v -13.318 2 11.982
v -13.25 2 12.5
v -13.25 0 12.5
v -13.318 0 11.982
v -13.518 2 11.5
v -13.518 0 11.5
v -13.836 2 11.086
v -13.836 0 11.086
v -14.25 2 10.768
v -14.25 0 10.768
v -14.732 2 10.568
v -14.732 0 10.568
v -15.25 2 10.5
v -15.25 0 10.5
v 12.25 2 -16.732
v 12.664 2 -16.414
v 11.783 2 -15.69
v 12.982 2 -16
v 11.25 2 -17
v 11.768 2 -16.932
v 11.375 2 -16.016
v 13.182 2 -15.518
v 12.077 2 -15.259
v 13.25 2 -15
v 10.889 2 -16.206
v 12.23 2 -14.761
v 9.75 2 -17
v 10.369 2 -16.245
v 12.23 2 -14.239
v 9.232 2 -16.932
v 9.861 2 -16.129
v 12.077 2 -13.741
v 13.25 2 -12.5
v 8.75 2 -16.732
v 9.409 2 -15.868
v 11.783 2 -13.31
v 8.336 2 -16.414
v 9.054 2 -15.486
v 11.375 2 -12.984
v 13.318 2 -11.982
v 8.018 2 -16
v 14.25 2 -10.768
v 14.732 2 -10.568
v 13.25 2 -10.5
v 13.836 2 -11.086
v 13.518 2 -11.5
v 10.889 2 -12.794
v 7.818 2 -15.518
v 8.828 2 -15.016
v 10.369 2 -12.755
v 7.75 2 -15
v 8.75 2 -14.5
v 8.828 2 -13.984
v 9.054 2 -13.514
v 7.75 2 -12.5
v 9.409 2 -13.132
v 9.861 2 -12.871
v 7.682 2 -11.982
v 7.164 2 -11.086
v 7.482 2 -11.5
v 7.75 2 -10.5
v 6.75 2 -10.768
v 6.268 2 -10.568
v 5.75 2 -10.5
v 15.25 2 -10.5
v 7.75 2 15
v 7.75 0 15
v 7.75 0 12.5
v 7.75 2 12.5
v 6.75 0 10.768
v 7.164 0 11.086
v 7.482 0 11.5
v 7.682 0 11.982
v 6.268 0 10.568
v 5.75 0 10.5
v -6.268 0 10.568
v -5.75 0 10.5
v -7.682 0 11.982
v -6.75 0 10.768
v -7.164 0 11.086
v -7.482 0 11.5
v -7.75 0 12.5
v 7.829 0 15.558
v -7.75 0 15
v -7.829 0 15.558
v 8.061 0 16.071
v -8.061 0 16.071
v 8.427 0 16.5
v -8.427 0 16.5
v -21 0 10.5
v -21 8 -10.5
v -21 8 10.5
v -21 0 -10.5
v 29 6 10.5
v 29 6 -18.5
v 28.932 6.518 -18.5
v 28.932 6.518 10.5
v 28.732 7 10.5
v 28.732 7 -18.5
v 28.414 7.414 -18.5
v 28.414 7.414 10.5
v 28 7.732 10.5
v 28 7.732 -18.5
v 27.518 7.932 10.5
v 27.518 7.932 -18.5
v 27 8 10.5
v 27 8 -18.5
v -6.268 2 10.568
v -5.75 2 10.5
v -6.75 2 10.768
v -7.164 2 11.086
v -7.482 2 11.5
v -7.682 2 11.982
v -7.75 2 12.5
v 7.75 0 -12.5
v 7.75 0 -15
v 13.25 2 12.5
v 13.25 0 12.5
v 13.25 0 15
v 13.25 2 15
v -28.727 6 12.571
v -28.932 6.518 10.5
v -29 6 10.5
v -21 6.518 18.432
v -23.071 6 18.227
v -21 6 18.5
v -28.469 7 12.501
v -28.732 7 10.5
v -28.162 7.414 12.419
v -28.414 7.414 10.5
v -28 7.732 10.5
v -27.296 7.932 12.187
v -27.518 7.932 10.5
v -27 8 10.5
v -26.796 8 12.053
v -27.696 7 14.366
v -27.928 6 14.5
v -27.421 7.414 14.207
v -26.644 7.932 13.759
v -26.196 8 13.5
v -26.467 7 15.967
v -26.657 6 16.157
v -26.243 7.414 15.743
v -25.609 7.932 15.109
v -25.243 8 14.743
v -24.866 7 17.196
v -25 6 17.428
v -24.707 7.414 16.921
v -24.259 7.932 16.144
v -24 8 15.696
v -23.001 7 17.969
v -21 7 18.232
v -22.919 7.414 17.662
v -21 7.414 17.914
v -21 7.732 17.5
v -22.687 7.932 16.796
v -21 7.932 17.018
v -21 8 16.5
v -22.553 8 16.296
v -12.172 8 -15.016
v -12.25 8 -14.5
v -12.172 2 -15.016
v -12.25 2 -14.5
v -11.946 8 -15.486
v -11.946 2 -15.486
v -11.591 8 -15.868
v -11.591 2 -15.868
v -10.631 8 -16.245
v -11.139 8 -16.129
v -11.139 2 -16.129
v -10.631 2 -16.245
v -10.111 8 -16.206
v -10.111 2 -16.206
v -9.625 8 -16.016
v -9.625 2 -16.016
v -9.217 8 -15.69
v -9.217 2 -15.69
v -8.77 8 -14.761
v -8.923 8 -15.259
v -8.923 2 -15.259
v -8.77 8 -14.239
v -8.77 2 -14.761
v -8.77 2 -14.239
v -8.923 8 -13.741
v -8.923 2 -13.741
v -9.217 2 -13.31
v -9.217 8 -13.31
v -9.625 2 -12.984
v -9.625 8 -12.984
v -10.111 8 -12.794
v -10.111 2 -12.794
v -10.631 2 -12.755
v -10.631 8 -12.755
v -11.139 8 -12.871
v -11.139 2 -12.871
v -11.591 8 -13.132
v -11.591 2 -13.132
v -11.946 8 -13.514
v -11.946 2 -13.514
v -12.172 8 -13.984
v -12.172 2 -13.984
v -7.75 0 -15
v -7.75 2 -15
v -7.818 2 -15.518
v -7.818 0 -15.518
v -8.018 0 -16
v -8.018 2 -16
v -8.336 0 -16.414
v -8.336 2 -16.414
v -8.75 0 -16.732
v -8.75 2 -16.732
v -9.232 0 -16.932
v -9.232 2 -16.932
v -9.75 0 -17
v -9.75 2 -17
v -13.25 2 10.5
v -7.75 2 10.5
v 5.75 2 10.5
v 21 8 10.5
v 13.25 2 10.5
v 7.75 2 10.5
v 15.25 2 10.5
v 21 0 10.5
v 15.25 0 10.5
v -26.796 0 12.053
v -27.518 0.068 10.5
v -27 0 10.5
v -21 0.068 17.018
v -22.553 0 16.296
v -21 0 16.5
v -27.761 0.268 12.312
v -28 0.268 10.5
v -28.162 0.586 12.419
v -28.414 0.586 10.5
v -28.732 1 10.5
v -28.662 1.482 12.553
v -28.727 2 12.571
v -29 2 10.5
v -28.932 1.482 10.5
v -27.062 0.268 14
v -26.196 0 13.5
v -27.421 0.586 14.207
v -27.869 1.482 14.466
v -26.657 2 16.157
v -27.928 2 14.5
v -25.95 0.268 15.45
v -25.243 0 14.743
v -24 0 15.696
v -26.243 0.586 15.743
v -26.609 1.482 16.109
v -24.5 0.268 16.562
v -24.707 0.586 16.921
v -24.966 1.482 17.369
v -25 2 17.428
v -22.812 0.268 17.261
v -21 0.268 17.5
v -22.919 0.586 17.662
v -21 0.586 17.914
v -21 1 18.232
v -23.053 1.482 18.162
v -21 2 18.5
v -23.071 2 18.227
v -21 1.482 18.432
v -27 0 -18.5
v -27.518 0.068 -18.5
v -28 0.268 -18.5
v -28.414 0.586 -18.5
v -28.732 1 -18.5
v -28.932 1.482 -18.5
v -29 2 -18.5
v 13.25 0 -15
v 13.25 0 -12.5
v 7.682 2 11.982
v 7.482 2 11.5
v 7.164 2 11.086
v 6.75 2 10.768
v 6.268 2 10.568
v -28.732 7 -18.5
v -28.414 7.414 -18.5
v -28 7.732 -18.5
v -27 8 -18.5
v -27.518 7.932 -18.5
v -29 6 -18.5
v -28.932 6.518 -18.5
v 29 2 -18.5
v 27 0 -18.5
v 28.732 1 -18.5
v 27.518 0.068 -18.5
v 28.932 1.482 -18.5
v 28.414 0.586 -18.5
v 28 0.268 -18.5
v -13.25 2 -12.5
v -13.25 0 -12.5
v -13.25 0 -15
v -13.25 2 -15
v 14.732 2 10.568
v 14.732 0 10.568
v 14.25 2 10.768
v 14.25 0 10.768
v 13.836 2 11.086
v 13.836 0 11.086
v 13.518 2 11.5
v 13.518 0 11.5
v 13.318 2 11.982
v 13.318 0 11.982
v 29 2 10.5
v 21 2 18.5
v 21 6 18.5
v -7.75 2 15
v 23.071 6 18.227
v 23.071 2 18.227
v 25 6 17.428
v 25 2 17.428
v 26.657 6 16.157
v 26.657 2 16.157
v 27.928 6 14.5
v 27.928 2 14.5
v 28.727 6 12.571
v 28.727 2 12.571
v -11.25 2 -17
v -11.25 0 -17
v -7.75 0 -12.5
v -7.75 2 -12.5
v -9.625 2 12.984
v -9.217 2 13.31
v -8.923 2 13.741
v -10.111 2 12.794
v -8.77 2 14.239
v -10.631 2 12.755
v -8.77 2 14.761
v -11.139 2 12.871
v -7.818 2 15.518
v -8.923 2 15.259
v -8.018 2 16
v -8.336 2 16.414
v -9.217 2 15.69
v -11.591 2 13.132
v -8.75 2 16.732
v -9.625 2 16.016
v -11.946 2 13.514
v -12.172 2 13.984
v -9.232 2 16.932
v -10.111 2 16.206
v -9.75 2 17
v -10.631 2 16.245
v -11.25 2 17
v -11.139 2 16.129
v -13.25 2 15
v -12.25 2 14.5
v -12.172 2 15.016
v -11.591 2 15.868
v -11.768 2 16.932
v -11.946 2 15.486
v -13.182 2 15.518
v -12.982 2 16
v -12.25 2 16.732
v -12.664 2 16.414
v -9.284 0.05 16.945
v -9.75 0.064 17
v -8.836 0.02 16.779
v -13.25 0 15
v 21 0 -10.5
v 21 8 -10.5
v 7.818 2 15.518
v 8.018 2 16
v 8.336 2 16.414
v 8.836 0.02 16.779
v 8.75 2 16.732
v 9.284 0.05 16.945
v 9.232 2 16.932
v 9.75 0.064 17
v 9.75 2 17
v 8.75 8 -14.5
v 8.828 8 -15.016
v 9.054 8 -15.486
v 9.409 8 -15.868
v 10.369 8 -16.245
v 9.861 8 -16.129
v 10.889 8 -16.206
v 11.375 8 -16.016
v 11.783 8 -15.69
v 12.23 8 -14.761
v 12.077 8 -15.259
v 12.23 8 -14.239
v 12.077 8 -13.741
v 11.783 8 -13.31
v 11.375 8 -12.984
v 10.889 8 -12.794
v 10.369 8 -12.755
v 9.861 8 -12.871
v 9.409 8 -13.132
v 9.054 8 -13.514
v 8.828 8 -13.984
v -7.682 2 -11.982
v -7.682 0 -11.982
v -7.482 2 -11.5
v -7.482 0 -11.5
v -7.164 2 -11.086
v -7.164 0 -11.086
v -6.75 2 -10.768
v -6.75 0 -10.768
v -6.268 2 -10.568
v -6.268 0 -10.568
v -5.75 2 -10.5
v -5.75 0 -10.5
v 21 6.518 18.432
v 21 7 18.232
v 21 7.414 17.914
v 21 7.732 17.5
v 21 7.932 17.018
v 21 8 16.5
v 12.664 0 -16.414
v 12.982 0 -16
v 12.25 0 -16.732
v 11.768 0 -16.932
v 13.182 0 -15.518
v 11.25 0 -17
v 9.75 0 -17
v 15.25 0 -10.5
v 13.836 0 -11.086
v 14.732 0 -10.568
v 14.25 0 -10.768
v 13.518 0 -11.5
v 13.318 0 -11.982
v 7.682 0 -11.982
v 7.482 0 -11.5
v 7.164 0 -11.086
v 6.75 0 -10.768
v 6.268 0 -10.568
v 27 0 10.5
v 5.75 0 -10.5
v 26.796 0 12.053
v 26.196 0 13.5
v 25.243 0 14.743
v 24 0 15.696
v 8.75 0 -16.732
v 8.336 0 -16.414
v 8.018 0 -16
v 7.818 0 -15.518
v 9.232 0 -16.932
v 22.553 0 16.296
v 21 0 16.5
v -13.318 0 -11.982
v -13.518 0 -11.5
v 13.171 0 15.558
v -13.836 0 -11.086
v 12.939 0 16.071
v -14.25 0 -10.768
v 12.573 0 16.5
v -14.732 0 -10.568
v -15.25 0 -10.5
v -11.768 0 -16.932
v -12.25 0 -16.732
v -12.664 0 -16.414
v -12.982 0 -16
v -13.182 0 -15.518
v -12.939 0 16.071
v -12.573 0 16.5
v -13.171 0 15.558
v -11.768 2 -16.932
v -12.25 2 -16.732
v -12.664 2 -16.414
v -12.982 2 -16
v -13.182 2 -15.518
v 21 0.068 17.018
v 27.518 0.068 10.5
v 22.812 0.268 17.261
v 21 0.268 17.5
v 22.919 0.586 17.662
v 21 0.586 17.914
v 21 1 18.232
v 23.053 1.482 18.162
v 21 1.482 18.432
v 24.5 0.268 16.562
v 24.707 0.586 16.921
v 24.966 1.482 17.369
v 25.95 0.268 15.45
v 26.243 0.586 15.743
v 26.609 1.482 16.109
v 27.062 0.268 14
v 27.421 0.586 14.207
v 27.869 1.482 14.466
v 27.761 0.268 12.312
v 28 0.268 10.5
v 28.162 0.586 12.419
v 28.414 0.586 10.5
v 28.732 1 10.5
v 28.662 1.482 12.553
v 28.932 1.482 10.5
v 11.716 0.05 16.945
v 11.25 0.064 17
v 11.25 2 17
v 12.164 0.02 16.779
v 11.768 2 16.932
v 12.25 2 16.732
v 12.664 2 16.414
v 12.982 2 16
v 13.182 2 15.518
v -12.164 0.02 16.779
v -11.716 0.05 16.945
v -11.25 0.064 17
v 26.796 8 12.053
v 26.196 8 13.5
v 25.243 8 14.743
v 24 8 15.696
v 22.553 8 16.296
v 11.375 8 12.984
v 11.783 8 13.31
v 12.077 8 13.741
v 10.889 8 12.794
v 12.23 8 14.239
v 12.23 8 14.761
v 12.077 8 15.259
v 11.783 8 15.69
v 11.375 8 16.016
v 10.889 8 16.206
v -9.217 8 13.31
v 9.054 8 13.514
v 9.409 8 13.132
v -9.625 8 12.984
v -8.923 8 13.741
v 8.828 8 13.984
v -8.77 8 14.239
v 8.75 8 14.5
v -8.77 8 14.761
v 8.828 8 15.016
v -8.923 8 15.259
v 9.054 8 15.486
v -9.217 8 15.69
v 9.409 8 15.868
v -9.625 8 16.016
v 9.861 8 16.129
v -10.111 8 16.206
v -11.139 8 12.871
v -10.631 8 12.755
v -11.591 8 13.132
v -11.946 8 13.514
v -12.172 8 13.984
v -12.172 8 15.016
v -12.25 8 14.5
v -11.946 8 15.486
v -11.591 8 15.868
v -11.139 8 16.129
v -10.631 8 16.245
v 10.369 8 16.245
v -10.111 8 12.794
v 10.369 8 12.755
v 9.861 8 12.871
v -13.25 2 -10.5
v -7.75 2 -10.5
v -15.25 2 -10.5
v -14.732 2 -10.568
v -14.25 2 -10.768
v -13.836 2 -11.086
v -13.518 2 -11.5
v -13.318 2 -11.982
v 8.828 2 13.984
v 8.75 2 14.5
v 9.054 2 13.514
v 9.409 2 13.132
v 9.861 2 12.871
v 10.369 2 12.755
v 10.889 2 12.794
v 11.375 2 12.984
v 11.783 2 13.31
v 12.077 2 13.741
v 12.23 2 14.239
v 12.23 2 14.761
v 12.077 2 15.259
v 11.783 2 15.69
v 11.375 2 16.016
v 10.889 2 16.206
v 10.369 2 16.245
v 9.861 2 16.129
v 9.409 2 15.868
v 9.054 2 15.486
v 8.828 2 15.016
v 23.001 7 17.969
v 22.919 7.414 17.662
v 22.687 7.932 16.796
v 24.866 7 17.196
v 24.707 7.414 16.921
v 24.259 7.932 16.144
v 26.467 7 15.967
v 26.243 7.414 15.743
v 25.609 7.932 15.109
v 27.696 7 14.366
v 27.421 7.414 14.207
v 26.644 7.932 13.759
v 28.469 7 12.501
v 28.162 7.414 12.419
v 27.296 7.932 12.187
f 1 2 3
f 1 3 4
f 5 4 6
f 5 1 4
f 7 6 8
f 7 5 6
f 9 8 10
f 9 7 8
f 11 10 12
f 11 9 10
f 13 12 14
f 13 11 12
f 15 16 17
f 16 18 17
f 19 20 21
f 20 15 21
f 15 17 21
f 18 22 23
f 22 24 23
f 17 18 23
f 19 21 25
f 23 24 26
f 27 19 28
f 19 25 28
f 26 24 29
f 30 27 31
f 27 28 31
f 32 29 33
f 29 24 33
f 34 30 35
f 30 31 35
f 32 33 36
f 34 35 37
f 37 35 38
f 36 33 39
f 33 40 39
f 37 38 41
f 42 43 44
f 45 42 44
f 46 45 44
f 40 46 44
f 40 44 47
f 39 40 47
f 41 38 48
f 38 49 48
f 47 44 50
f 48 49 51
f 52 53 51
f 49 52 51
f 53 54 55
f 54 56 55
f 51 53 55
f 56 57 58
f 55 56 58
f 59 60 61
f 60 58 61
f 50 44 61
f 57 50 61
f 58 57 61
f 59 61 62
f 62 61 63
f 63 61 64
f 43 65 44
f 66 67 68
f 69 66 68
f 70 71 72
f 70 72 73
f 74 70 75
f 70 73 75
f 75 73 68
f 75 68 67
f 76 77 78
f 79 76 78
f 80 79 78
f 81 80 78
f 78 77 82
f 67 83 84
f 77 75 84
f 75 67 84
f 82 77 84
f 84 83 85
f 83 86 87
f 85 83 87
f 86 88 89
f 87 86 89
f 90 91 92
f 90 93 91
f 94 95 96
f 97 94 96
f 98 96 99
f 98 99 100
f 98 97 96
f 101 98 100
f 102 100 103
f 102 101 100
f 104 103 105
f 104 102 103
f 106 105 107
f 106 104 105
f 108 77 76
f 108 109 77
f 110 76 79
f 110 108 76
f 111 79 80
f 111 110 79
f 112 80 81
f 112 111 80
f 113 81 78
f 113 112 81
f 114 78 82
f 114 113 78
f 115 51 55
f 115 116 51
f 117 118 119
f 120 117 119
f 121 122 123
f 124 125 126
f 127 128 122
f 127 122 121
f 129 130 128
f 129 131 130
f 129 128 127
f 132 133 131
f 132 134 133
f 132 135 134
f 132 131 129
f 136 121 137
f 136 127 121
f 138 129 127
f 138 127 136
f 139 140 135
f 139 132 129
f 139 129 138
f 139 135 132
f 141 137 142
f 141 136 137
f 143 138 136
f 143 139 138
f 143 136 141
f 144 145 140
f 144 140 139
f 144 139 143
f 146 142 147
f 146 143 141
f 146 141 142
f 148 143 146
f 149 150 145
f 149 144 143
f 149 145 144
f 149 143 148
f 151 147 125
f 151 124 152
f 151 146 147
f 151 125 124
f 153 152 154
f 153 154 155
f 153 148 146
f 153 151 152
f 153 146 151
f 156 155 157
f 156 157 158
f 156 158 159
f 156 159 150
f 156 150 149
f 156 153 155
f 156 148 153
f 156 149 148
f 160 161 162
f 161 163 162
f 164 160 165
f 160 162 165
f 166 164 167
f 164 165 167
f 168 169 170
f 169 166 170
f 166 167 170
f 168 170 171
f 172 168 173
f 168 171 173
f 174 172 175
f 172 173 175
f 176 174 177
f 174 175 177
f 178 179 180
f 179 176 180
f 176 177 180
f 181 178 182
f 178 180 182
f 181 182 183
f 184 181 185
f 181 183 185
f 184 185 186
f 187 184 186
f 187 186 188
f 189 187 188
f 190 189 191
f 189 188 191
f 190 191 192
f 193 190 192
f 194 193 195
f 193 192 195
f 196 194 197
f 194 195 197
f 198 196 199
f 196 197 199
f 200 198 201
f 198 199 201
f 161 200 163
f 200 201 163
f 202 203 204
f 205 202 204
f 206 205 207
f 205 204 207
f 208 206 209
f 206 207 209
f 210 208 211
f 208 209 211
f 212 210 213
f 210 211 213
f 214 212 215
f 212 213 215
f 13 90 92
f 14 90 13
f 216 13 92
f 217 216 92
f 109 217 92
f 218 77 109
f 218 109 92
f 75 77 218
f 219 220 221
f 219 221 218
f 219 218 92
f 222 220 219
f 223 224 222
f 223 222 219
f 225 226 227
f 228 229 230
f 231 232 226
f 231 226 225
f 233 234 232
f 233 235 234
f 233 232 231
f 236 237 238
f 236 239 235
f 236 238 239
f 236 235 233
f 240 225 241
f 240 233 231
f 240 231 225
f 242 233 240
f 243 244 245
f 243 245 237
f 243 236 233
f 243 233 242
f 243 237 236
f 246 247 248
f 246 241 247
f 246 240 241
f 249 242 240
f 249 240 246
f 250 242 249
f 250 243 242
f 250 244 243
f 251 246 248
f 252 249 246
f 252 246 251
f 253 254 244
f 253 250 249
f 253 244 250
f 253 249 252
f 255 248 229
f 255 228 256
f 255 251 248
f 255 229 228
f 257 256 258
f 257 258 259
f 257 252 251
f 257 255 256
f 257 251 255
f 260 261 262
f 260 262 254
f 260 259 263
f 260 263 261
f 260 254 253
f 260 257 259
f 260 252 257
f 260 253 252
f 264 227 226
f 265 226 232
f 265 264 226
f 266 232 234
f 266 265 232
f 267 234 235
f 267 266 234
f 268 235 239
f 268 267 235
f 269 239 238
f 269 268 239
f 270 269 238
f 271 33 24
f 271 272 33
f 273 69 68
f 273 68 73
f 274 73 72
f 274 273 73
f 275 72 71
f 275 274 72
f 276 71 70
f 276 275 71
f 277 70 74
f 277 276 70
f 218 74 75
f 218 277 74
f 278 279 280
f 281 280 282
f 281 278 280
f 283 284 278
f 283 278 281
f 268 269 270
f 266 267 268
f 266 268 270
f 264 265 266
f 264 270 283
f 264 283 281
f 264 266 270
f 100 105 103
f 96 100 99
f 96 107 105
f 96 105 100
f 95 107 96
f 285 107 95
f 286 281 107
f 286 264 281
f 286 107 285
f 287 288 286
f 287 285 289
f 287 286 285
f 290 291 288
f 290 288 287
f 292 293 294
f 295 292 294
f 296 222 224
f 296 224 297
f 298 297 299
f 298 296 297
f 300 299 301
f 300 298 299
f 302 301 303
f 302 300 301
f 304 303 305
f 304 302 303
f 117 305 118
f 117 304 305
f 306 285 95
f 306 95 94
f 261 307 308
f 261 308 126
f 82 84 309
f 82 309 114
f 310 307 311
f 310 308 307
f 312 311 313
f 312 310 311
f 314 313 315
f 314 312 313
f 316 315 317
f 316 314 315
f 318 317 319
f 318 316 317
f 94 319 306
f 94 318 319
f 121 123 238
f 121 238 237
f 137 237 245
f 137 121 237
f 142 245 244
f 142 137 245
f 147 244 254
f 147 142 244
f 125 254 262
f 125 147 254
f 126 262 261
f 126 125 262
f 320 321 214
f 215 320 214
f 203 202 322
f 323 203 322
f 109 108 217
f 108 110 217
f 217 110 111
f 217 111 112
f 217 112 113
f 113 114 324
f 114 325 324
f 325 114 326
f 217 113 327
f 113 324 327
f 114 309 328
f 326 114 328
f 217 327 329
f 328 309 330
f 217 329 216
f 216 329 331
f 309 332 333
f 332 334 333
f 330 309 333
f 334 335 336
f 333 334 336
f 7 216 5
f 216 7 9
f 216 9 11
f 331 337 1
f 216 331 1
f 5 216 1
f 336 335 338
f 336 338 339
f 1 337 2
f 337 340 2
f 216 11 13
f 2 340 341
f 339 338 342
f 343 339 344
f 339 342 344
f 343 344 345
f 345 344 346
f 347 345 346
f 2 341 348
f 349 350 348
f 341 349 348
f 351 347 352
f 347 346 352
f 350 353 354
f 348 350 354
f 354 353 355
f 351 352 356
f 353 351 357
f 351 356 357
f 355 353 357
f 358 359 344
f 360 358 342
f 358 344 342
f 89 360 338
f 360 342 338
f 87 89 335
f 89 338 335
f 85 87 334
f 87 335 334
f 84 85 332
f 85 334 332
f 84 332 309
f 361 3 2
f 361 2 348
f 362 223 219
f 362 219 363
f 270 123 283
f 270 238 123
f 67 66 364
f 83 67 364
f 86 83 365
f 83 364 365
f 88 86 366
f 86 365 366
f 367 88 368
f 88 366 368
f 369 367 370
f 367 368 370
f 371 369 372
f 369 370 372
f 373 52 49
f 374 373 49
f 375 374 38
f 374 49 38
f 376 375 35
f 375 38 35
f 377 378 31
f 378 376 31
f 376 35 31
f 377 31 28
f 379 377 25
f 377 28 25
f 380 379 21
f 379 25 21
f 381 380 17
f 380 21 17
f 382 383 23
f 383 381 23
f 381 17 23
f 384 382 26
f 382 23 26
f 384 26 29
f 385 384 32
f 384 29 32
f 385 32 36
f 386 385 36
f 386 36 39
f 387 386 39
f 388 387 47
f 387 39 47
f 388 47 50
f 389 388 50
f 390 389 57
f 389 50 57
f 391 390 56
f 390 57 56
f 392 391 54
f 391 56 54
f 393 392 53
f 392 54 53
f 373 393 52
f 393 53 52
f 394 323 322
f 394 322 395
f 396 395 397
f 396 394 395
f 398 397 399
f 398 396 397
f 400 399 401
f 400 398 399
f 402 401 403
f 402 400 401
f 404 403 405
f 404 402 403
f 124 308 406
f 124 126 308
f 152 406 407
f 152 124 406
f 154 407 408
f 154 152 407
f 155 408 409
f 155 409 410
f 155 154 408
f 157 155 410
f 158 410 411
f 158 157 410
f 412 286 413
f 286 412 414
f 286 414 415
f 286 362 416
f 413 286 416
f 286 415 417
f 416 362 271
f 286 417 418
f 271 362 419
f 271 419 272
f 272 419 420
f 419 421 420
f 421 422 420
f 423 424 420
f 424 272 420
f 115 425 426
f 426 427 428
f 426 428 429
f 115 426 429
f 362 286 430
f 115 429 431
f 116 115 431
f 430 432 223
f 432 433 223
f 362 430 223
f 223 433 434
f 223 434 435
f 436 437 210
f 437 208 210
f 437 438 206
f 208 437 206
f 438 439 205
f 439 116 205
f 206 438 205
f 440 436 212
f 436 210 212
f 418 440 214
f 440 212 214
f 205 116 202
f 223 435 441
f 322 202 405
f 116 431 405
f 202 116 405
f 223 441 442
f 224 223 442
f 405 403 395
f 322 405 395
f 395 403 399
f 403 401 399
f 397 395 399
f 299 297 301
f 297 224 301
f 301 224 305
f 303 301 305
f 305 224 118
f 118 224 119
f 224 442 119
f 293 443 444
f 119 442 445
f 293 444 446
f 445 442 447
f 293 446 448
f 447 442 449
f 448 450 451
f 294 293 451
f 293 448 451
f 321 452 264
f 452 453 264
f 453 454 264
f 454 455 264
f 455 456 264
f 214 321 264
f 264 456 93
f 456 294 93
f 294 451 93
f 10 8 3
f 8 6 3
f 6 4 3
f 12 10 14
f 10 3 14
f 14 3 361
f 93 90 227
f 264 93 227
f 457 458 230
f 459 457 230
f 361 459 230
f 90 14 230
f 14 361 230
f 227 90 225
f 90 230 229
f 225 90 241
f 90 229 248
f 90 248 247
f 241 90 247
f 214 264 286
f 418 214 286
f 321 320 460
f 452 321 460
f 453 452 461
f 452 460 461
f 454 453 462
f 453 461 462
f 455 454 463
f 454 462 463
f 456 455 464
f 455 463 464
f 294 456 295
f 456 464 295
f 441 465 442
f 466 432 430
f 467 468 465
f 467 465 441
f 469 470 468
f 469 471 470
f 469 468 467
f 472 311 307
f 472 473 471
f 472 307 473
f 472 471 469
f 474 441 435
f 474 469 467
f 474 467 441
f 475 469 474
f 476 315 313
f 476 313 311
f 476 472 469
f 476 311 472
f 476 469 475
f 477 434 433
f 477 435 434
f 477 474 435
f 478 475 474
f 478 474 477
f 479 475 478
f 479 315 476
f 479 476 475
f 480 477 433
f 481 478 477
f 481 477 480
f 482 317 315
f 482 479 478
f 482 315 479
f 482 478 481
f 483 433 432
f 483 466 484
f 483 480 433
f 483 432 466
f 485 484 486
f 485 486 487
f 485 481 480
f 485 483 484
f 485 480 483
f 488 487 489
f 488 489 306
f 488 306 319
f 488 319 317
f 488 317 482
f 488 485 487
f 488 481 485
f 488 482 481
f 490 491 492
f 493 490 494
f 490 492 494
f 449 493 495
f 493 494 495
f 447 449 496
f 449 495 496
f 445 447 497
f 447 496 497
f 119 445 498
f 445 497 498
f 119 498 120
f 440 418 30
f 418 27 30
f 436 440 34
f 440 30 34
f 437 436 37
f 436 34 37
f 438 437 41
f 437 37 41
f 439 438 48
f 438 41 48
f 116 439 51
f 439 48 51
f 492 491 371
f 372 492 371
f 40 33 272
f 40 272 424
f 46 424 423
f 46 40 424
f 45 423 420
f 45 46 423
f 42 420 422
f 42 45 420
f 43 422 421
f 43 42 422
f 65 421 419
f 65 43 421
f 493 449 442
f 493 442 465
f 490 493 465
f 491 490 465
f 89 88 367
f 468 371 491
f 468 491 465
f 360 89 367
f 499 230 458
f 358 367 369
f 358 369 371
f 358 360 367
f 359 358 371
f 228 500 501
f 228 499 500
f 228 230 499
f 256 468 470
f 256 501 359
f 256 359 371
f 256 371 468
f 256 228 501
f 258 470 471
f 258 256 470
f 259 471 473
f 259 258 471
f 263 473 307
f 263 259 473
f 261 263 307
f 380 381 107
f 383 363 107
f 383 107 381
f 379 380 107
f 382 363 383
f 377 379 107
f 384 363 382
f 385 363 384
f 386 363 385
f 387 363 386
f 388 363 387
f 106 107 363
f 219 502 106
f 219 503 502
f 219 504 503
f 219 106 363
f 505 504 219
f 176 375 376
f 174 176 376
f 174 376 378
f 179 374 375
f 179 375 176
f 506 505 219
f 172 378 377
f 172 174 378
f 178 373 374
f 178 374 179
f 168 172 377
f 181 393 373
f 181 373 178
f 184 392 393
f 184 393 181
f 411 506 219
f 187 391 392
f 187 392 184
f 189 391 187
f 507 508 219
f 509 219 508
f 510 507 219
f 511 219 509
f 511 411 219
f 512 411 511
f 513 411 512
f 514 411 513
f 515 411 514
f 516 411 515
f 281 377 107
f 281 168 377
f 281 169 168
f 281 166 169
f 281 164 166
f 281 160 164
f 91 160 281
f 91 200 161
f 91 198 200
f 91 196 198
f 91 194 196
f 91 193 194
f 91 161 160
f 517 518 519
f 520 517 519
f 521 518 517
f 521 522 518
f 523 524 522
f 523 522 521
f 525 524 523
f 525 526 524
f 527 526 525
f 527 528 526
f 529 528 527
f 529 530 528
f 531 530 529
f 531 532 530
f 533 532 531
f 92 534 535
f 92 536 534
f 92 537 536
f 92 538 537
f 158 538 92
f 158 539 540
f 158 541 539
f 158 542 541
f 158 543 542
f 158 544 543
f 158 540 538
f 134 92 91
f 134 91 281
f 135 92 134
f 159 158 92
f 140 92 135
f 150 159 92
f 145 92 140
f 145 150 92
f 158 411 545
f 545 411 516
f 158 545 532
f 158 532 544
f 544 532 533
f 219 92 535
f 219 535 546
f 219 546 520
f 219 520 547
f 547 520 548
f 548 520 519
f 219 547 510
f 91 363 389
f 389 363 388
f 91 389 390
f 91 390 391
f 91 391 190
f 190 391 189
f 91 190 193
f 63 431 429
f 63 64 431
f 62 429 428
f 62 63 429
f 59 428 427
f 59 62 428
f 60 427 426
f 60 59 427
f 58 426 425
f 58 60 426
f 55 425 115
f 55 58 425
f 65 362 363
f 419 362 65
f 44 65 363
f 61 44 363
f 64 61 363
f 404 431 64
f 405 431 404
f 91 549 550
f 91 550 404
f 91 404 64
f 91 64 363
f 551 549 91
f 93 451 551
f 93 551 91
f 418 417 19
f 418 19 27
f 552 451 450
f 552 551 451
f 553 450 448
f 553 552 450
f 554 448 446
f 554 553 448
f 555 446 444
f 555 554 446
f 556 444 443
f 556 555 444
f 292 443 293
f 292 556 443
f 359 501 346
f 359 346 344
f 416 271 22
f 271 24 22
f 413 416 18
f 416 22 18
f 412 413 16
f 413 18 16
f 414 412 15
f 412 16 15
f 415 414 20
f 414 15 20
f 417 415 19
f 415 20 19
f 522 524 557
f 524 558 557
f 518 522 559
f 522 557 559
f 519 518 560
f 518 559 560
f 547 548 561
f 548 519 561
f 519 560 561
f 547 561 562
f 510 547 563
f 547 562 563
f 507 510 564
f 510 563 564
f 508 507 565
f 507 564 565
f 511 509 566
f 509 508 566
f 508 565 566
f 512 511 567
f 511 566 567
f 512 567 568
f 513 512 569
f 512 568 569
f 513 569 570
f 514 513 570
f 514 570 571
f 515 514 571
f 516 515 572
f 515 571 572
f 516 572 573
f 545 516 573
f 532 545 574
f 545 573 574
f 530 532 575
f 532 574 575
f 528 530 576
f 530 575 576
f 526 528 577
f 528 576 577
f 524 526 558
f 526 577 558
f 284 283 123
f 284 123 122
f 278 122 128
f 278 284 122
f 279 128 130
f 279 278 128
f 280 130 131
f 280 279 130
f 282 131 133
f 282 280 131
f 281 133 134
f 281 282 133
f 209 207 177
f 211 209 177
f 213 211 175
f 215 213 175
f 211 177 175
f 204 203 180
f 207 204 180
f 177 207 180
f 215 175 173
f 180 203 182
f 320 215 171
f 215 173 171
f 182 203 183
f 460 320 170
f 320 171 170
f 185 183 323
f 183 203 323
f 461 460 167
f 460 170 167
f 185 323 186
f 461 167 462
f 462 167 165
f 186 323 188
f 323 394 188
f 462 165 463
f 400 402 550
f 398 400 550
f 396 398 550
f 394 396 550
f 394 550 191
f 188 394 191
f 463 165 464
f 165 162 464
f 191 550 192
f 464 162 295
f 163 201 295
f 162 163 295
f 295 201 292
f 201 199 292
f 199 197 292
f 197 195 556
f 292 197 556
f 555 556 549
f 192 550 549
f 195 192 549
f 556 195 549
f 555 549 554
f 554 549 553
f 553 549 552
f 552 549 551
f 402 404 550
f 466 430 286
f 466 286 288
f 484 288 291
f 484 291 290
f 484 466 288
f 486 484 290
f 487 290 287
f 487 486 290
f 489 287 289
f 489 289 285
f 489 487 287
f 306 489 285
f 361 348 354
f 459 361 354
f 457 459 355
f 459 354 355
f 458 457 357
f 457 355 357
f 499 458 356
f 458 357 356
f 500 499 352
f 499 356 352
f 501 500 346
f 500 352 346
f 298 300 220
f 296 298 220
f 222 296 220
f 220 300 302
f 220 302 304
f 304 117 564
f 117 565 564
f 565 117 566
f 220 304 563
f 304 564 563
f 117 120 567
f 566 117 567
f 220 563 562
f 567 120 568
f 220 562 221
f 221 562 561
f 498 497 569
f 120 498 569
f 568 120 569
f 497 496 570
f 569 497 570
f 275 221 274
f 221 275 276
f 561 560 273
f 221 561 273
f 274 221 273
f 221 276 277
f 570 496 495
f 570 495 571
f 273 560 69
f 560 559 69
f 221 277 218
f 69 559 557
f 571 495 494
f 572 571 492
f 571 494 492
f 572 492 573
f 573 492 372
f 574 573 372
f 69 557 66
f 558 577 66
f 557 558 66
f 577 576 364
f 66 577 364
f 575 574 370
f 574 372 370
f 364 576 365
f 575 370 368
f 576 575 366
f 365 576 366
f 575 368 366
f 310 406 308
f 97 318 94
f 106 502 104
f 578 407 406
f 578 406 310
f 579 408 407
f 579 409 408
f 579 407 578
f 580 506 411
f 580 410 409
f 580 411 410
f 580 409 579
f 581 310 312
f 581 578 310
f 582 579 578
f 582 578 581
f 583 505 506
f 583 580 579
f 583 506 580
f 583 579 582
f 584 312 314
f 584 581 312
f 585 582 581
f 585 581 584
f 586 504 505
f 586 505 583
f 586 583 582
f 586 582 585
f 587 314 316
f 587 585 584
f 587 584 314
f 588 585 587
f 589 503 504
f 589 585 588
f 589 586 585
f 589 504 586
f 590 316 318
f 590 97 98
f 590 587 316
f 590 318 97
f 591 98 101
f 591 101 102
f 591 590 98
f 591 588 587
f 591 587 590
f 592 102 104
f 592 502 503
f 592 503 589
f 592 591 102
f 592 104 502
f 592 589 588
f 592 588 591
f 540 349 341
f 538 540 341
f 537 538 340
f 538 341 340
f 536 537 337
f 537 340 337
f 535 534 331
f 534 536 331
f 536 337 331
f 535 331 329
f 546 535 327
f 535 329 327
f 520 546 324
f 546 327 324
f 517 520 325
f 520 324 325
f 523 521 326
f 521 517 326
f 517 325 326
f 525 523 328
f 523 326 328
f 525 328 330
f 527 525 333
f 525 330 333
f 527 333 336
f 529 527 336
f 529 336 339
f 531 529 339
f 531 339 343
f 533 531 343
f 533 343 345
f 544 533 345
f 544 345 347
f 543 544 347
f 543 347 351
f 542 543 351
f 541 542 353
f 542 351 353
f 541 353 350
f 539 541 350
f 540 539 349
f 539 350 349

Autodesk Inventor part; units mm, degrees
ref_plane "YZ Plane" through (0, 0, 0) normal (1, 0, 0) x (0, 1, 0)
ref_plane "XZ Plane" through (0, 0, 0) normal (0, 1, 0) x (-1, 0, 0)
ref_plane "XY Plane" through (0, 0, 0) normal (0, 0, 1) x (1, 0, 0)
sketch "Sketch1" plane through (0, 0, 0) normal (0, 1, 0) x (-1, 0, 0)
  line L0 (21, 10.5) -> (-21, 10.5)
  line L1 (-21, 10.5) -> (-21, -10.5)
  line L2 (-21, -10.5) -> (21, -10.5)
  line L3 (21, -10.5) -> (21, 10.5)
  line L4 (21, 10.5) -> (-21, -10.5) construction
  line L5 (-21, 10.5) -> (21, -10.5) construction
  line L6 (-29, 18.5) -> (29, 18.5)
  line L7 (29, 18.5) -> (29, -18.5)
  line L8 (29, -18.5) -> (-29, -18.5)
  line L9 (-29, -18.5) -> (-29, 18.5)
  circle A0 centre (10.5, 14.5) radius 1.75
  line L10 (0, 10.5) -> (0, -10.5) construction
  line L11 (-21, 0) -> (21, 0) construction
  circle A1 centre (10.5, -14.5) radius 1.75
  circle A2 centre (-10.5, 14.5) radius 1.75
  circle A3 centre (-10.5, -14.5) radius 1.75
  line L12 (-21, 10.5) -> (-27, 10.5)
  line L13 (-27, 10.5) -> (-27, -10.5)
  line L14 (-27, -10.5) -> (-21, -10.5)
  line L15 (-21, -10.5) -> (-21, 10.5)
  line L16 (21, 10.5) -> (27, 10.5)
  line L17 (27, 10.5) -> (27, -10.5)
  line L18 (27, -10.5) -> (21, -10.5)
  line L19 (7.75, 10.5) -> (13.25, 10.5)
  line L20 (13.25, 10.5) -> (13.25, 17)
  line L21 (13.25, 17) -> (7.75, 17)
  line L22 (7.75, 17) -> (7.75, 10.5)
  line L23 (-13.25, 10.5) -> (-13.25, 17)
  line L24 (-13.25, 17) -> (-7.75, 17)
  line L25 (-7.75, 17) -> (-7.75, 10.5)
  line L26 (13.25, -10.5) -> (13.25, -17)
  line L27 (13.25, -17) -> (7.75, -17)
  line L28 (7.75, -17) -> (7.75, -10.5)
  line L29 (-7.75, -17) -> (-7.75, -10.5)
  line L30 (-13.25, -17) -> (-7.75, -17)
  line L31 (-13.25, -10.5) -> (-13.25, -17)
  point P0 (0, 0)
  dimension "d0" = 21
  dimension "d1" = 42
  dimension "d2" = 8
  dimension "d3" = 3.5
  dimension "d4" = 10.5
  dimension "d5" = 4
  dimension "d6" = 6
  dimension "d7" = 21
  dimension "d15" = 5.5
  dimension "d17" = 2.5
  dimension "d18" = 2.75
extrude "Extrusion1" add sketch "Sketch1" along normal blind 8 contours L16 L17 L18 L3 | L0 L22 L21 L20 | L26 L27 L28 L2 | L0 L23 L24 L25 | L29 L30 L31 L2 | L1 L14 L13 L12 | L6 L7 L8 L9
fillet "Fillet1" radius 8 2 edges at (-29, 4, 18.5) (29, 4, 18.5)
fillet "Fillet3" radius 2 10 edges at (-26.6569, 0, 16.1569) (0, 0, 18.5) (26.6569, 0, 16.1569) (29, 0, -4) (-29, 0, -4) (-26.6569, 8, 16.1569) (0, 8, 18.5) (26.6569, 8, 16.1569) (29, 8, -4) (-29, 8, -4)
extrude "Extrusion3" cut sketch "Sketch1" along normal blind 2 contours L0 L22 L21 L20 | L26 L27 L28 L2 | L0 L23 L24 L25 | L29 L30 L31 L2
fillet "Fillet4" radius 2 8 edges at (13.25, 1.0318, 17) (7.75, 1.0318, 17) (-13.25, 1.0318, 17) (-7.75, 1.0318, 17) (-13.25, 1, -17) (-7.75, 1, -17) (13.25, 1, -17) (7.75, 1, -17)
fillet "Fillet5" radius 2 8 edges at (-7.75, 1, -10.5) (-13.25, 1, -10.5) (7.75, 1, -10.5) (13.25, 1, -10.5) (13.25, 1, 10.5) (7.75, 1, 10.5) (-7.75, 1, 10.5) (-13.25, 1, 10.5)
equation "\"d0\" = MountWidth"
equation "\"d1\" = MountLength"
equation "\"d2\" = MountThickness"
equation "\"d3\" = THROUGH_DIAMETER"
equation "\"d4\" = 0.25 * MountLength"
equation "\"d5\" = 0.5 * MountThickness"
equation "\"d7\" = MountWidth"
equation "\"d8\" = OUTER_HEIGHT"
equation "\"d12\" = OUTER_FILLET"
equation "\"d14\" = PART_FILLET"
equation "\"MountWidth\" = 21"
equation "\"MountLength\" = 42"
equation "\"MountThickness\" = 8"
equation "\"THROUGH_DIAMETER\" = 3.5"
equation "\"OUTER_HEIGHT\" = 8"
equation "\"OUTER_FILLET\" = 8"
equation "\"PART_FILLET\" = 2"
properties part number "CoxaServoCutout"
